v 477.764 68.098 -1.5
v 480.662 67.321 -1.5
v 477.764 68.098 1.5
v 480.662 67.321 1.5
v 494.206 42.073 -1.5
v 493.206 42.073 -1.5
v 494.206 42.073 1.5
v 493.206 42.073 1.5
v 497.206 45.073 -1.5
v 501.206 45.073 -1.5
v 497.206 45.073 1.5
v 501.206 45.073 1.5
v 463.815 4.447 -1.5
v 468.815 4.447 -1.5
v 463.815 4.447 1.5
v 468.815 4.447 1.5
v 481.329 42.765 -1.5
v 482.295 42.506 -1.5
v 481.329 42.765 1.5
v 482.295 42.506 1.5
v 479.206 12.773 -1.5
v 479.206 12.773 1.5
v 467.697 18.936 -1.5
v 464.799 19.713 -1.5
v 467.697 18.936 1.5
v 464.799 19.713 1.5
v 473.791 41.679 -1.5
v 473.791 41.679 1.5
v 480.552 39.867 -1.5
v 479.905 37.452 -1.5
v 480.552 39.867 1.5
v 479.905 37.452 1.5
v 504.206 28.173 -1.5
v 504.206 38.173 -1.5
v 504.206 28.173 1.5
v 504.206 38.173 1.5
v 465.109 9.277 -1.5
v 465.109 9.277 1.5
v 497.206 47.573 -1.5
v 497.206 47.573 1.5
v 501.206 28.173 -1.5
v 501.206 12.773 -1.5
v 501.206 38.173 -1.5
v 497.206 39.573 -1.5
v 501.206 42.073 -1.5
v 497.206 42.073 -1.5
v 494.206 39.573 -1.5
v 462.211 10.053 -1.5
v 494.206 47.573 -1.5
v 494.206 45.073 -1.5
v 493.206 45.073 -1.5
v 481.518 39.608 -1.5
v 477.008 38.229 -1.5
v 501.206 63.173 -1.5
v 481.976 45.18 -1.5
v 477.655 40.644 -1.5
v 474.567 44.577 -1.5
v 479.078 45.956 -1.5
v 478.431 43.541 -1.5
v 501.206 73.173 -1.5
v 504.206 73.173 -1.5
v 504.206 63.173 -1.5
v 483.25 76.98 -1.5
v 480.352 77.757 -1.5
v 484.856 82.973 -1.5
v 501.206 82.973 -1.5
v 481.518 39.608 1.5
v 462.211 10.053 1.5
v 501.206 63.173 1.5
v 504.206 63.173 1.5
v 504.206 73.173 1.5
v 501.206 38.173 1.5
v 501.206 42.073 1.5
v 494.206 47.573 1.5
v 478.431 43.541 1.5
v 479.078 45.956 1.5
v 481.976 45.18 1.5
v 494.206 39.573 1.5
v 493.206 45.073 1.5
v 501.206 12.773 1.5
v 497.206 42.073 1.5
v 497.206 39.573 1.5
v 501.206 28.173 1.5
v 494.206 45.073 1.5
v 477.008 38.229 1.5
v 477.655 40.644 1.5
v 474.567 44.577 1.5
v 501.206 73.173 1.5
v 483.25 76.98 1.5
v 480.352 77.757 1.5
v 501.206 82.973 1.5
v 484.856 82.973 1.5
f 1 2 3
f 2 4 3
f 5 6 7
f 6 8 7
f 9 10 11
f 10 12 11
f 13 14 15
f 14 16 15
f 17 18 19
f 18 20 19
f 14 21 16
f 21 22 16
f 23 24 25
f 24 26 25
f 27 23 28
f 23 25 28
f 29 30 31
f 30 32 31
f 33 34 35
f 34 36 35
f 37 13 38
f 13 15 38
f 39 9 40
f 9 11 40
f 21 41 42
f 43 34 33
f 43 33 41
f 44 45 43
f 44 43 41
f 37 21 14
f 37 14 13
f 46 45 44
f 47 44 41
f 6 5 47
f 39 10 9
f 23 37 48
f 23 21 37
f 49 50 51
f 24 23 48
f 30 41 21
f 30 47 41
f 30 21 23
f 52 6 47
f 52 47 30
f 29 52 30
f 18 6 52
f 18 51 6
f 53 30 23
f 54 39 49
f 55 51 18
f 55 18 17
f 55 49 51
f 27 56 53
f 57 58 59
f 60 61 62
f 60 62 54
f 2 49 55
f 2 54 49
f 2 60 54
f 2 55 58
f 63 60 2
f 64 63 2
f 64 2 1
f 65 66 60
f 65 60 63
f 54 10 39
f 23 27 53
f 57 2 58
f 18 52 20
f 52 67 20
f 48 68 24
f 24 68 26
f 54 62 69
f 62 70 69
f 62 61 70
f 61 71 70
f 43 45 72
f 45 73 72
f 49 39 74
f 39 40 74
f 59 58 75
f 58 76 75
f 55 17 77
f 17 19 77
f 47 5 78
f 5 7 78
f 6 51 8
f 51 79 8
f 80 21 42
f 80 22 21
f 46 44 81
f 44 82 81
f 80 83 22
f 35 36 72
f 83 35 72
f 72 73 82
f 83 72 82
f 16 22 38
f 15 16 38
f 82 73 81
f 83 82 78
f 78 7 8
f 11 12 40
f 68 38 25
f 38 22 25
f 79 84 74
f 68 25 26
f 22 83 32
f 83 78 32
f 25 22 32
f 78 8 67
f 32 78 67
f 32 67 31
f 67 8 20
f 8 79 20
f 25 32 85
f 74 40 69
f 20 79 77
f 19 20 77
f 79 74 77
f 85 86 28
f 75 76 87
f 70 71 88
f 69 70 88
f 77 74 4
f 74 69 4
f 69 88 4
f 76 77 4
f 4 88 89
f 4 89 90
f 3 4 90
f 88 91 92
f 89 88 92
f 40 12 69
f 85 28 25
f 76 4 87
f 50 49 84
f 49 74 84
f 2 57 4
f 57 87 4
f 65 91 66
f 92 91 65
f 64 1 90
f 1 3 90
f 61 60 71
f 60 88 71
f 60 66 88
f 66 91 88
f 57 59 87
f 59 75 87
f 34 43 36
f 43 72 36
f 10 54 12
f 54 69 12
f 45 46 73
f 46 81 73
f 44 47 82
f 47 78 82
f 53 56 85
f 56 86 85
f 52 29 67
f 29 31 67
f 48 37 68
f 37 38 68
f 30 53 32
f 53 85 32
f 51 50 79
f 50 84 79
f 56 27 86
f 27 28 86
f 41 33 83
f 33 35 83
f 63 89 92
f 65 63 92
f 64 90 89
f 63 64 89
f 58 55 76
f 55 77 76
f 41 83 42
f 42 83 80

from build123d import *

# Parameters (mm, degrees)
SALIENTE_EXTRUIR1_DEPTH = 1.5


with BuildPart() as part:
    # Croquis1 → Saliente-Extruir1 (new, symmetric)
    with BuildSketch(Plane.XY):
        Polygon((484.855720511, 82.973038085), (491.215178715, 82.973038085), (501.205555648, 82.973038085), (501.205555648, 73.173108985), (504.205555648, 73.173108985), (504.205555648, 63.173108985), (501.205555648, 63.173108985), (501.205555648, 45.073108985), (497.205555648, 45.073108985), (497.205555648, 47.573108985), (494.205555648, 47.573108985), (494.205555648, 45.073108985), (493.205555648, 45.073108985), (493.205555648, 42.073108985), (494.205555648, 42.073108985), (494.205555648, 39.573108985), (497.205555648, 39.573108985), (497.205555648, 42.073108985), (501.205555648, 42.073108985), (501.205555648, 38.173108985), (504.205555648, 38.173108985), (504.205555648, 28.173108985), (501.205555648, 28.173108985), (501.205555648, 12.773108985), (494.855720505, 12.773108985), (479.205555648, 12.773108985), (468.814796849, 4.447241951), (463.814796852, 4.447241951), (465.108892077, 9.276871079), (462.2111146, 10.053328214), (464.799305049, 19.712586471), (467.697082526, 18.936129336), (473.790976943, 41.678852916), (477.654680248, 40.643576736), (477.007632636, 38.22876217), (479.905410114, 37.452305035), (480.552457727, 39.867119601), (481.518383553, 39.608300556), (482.294840689, 42.506078034), (481.328914862, 42.764897079), (481.975962475, 45.179711645), (479.078184996, 45.956168781), (478.431137384, 43.541354215), (474.567434078, 44.576630395), (480.661787289, 67.321066215), (477.764009811, 68.097523349), (480.352200261, 77.756781606), (483.249977738, 76.980324471), align=None)
    extrude(amount=SALIENTE_EXTRUIR1_DEPTH, both=True)


solid = part.part
